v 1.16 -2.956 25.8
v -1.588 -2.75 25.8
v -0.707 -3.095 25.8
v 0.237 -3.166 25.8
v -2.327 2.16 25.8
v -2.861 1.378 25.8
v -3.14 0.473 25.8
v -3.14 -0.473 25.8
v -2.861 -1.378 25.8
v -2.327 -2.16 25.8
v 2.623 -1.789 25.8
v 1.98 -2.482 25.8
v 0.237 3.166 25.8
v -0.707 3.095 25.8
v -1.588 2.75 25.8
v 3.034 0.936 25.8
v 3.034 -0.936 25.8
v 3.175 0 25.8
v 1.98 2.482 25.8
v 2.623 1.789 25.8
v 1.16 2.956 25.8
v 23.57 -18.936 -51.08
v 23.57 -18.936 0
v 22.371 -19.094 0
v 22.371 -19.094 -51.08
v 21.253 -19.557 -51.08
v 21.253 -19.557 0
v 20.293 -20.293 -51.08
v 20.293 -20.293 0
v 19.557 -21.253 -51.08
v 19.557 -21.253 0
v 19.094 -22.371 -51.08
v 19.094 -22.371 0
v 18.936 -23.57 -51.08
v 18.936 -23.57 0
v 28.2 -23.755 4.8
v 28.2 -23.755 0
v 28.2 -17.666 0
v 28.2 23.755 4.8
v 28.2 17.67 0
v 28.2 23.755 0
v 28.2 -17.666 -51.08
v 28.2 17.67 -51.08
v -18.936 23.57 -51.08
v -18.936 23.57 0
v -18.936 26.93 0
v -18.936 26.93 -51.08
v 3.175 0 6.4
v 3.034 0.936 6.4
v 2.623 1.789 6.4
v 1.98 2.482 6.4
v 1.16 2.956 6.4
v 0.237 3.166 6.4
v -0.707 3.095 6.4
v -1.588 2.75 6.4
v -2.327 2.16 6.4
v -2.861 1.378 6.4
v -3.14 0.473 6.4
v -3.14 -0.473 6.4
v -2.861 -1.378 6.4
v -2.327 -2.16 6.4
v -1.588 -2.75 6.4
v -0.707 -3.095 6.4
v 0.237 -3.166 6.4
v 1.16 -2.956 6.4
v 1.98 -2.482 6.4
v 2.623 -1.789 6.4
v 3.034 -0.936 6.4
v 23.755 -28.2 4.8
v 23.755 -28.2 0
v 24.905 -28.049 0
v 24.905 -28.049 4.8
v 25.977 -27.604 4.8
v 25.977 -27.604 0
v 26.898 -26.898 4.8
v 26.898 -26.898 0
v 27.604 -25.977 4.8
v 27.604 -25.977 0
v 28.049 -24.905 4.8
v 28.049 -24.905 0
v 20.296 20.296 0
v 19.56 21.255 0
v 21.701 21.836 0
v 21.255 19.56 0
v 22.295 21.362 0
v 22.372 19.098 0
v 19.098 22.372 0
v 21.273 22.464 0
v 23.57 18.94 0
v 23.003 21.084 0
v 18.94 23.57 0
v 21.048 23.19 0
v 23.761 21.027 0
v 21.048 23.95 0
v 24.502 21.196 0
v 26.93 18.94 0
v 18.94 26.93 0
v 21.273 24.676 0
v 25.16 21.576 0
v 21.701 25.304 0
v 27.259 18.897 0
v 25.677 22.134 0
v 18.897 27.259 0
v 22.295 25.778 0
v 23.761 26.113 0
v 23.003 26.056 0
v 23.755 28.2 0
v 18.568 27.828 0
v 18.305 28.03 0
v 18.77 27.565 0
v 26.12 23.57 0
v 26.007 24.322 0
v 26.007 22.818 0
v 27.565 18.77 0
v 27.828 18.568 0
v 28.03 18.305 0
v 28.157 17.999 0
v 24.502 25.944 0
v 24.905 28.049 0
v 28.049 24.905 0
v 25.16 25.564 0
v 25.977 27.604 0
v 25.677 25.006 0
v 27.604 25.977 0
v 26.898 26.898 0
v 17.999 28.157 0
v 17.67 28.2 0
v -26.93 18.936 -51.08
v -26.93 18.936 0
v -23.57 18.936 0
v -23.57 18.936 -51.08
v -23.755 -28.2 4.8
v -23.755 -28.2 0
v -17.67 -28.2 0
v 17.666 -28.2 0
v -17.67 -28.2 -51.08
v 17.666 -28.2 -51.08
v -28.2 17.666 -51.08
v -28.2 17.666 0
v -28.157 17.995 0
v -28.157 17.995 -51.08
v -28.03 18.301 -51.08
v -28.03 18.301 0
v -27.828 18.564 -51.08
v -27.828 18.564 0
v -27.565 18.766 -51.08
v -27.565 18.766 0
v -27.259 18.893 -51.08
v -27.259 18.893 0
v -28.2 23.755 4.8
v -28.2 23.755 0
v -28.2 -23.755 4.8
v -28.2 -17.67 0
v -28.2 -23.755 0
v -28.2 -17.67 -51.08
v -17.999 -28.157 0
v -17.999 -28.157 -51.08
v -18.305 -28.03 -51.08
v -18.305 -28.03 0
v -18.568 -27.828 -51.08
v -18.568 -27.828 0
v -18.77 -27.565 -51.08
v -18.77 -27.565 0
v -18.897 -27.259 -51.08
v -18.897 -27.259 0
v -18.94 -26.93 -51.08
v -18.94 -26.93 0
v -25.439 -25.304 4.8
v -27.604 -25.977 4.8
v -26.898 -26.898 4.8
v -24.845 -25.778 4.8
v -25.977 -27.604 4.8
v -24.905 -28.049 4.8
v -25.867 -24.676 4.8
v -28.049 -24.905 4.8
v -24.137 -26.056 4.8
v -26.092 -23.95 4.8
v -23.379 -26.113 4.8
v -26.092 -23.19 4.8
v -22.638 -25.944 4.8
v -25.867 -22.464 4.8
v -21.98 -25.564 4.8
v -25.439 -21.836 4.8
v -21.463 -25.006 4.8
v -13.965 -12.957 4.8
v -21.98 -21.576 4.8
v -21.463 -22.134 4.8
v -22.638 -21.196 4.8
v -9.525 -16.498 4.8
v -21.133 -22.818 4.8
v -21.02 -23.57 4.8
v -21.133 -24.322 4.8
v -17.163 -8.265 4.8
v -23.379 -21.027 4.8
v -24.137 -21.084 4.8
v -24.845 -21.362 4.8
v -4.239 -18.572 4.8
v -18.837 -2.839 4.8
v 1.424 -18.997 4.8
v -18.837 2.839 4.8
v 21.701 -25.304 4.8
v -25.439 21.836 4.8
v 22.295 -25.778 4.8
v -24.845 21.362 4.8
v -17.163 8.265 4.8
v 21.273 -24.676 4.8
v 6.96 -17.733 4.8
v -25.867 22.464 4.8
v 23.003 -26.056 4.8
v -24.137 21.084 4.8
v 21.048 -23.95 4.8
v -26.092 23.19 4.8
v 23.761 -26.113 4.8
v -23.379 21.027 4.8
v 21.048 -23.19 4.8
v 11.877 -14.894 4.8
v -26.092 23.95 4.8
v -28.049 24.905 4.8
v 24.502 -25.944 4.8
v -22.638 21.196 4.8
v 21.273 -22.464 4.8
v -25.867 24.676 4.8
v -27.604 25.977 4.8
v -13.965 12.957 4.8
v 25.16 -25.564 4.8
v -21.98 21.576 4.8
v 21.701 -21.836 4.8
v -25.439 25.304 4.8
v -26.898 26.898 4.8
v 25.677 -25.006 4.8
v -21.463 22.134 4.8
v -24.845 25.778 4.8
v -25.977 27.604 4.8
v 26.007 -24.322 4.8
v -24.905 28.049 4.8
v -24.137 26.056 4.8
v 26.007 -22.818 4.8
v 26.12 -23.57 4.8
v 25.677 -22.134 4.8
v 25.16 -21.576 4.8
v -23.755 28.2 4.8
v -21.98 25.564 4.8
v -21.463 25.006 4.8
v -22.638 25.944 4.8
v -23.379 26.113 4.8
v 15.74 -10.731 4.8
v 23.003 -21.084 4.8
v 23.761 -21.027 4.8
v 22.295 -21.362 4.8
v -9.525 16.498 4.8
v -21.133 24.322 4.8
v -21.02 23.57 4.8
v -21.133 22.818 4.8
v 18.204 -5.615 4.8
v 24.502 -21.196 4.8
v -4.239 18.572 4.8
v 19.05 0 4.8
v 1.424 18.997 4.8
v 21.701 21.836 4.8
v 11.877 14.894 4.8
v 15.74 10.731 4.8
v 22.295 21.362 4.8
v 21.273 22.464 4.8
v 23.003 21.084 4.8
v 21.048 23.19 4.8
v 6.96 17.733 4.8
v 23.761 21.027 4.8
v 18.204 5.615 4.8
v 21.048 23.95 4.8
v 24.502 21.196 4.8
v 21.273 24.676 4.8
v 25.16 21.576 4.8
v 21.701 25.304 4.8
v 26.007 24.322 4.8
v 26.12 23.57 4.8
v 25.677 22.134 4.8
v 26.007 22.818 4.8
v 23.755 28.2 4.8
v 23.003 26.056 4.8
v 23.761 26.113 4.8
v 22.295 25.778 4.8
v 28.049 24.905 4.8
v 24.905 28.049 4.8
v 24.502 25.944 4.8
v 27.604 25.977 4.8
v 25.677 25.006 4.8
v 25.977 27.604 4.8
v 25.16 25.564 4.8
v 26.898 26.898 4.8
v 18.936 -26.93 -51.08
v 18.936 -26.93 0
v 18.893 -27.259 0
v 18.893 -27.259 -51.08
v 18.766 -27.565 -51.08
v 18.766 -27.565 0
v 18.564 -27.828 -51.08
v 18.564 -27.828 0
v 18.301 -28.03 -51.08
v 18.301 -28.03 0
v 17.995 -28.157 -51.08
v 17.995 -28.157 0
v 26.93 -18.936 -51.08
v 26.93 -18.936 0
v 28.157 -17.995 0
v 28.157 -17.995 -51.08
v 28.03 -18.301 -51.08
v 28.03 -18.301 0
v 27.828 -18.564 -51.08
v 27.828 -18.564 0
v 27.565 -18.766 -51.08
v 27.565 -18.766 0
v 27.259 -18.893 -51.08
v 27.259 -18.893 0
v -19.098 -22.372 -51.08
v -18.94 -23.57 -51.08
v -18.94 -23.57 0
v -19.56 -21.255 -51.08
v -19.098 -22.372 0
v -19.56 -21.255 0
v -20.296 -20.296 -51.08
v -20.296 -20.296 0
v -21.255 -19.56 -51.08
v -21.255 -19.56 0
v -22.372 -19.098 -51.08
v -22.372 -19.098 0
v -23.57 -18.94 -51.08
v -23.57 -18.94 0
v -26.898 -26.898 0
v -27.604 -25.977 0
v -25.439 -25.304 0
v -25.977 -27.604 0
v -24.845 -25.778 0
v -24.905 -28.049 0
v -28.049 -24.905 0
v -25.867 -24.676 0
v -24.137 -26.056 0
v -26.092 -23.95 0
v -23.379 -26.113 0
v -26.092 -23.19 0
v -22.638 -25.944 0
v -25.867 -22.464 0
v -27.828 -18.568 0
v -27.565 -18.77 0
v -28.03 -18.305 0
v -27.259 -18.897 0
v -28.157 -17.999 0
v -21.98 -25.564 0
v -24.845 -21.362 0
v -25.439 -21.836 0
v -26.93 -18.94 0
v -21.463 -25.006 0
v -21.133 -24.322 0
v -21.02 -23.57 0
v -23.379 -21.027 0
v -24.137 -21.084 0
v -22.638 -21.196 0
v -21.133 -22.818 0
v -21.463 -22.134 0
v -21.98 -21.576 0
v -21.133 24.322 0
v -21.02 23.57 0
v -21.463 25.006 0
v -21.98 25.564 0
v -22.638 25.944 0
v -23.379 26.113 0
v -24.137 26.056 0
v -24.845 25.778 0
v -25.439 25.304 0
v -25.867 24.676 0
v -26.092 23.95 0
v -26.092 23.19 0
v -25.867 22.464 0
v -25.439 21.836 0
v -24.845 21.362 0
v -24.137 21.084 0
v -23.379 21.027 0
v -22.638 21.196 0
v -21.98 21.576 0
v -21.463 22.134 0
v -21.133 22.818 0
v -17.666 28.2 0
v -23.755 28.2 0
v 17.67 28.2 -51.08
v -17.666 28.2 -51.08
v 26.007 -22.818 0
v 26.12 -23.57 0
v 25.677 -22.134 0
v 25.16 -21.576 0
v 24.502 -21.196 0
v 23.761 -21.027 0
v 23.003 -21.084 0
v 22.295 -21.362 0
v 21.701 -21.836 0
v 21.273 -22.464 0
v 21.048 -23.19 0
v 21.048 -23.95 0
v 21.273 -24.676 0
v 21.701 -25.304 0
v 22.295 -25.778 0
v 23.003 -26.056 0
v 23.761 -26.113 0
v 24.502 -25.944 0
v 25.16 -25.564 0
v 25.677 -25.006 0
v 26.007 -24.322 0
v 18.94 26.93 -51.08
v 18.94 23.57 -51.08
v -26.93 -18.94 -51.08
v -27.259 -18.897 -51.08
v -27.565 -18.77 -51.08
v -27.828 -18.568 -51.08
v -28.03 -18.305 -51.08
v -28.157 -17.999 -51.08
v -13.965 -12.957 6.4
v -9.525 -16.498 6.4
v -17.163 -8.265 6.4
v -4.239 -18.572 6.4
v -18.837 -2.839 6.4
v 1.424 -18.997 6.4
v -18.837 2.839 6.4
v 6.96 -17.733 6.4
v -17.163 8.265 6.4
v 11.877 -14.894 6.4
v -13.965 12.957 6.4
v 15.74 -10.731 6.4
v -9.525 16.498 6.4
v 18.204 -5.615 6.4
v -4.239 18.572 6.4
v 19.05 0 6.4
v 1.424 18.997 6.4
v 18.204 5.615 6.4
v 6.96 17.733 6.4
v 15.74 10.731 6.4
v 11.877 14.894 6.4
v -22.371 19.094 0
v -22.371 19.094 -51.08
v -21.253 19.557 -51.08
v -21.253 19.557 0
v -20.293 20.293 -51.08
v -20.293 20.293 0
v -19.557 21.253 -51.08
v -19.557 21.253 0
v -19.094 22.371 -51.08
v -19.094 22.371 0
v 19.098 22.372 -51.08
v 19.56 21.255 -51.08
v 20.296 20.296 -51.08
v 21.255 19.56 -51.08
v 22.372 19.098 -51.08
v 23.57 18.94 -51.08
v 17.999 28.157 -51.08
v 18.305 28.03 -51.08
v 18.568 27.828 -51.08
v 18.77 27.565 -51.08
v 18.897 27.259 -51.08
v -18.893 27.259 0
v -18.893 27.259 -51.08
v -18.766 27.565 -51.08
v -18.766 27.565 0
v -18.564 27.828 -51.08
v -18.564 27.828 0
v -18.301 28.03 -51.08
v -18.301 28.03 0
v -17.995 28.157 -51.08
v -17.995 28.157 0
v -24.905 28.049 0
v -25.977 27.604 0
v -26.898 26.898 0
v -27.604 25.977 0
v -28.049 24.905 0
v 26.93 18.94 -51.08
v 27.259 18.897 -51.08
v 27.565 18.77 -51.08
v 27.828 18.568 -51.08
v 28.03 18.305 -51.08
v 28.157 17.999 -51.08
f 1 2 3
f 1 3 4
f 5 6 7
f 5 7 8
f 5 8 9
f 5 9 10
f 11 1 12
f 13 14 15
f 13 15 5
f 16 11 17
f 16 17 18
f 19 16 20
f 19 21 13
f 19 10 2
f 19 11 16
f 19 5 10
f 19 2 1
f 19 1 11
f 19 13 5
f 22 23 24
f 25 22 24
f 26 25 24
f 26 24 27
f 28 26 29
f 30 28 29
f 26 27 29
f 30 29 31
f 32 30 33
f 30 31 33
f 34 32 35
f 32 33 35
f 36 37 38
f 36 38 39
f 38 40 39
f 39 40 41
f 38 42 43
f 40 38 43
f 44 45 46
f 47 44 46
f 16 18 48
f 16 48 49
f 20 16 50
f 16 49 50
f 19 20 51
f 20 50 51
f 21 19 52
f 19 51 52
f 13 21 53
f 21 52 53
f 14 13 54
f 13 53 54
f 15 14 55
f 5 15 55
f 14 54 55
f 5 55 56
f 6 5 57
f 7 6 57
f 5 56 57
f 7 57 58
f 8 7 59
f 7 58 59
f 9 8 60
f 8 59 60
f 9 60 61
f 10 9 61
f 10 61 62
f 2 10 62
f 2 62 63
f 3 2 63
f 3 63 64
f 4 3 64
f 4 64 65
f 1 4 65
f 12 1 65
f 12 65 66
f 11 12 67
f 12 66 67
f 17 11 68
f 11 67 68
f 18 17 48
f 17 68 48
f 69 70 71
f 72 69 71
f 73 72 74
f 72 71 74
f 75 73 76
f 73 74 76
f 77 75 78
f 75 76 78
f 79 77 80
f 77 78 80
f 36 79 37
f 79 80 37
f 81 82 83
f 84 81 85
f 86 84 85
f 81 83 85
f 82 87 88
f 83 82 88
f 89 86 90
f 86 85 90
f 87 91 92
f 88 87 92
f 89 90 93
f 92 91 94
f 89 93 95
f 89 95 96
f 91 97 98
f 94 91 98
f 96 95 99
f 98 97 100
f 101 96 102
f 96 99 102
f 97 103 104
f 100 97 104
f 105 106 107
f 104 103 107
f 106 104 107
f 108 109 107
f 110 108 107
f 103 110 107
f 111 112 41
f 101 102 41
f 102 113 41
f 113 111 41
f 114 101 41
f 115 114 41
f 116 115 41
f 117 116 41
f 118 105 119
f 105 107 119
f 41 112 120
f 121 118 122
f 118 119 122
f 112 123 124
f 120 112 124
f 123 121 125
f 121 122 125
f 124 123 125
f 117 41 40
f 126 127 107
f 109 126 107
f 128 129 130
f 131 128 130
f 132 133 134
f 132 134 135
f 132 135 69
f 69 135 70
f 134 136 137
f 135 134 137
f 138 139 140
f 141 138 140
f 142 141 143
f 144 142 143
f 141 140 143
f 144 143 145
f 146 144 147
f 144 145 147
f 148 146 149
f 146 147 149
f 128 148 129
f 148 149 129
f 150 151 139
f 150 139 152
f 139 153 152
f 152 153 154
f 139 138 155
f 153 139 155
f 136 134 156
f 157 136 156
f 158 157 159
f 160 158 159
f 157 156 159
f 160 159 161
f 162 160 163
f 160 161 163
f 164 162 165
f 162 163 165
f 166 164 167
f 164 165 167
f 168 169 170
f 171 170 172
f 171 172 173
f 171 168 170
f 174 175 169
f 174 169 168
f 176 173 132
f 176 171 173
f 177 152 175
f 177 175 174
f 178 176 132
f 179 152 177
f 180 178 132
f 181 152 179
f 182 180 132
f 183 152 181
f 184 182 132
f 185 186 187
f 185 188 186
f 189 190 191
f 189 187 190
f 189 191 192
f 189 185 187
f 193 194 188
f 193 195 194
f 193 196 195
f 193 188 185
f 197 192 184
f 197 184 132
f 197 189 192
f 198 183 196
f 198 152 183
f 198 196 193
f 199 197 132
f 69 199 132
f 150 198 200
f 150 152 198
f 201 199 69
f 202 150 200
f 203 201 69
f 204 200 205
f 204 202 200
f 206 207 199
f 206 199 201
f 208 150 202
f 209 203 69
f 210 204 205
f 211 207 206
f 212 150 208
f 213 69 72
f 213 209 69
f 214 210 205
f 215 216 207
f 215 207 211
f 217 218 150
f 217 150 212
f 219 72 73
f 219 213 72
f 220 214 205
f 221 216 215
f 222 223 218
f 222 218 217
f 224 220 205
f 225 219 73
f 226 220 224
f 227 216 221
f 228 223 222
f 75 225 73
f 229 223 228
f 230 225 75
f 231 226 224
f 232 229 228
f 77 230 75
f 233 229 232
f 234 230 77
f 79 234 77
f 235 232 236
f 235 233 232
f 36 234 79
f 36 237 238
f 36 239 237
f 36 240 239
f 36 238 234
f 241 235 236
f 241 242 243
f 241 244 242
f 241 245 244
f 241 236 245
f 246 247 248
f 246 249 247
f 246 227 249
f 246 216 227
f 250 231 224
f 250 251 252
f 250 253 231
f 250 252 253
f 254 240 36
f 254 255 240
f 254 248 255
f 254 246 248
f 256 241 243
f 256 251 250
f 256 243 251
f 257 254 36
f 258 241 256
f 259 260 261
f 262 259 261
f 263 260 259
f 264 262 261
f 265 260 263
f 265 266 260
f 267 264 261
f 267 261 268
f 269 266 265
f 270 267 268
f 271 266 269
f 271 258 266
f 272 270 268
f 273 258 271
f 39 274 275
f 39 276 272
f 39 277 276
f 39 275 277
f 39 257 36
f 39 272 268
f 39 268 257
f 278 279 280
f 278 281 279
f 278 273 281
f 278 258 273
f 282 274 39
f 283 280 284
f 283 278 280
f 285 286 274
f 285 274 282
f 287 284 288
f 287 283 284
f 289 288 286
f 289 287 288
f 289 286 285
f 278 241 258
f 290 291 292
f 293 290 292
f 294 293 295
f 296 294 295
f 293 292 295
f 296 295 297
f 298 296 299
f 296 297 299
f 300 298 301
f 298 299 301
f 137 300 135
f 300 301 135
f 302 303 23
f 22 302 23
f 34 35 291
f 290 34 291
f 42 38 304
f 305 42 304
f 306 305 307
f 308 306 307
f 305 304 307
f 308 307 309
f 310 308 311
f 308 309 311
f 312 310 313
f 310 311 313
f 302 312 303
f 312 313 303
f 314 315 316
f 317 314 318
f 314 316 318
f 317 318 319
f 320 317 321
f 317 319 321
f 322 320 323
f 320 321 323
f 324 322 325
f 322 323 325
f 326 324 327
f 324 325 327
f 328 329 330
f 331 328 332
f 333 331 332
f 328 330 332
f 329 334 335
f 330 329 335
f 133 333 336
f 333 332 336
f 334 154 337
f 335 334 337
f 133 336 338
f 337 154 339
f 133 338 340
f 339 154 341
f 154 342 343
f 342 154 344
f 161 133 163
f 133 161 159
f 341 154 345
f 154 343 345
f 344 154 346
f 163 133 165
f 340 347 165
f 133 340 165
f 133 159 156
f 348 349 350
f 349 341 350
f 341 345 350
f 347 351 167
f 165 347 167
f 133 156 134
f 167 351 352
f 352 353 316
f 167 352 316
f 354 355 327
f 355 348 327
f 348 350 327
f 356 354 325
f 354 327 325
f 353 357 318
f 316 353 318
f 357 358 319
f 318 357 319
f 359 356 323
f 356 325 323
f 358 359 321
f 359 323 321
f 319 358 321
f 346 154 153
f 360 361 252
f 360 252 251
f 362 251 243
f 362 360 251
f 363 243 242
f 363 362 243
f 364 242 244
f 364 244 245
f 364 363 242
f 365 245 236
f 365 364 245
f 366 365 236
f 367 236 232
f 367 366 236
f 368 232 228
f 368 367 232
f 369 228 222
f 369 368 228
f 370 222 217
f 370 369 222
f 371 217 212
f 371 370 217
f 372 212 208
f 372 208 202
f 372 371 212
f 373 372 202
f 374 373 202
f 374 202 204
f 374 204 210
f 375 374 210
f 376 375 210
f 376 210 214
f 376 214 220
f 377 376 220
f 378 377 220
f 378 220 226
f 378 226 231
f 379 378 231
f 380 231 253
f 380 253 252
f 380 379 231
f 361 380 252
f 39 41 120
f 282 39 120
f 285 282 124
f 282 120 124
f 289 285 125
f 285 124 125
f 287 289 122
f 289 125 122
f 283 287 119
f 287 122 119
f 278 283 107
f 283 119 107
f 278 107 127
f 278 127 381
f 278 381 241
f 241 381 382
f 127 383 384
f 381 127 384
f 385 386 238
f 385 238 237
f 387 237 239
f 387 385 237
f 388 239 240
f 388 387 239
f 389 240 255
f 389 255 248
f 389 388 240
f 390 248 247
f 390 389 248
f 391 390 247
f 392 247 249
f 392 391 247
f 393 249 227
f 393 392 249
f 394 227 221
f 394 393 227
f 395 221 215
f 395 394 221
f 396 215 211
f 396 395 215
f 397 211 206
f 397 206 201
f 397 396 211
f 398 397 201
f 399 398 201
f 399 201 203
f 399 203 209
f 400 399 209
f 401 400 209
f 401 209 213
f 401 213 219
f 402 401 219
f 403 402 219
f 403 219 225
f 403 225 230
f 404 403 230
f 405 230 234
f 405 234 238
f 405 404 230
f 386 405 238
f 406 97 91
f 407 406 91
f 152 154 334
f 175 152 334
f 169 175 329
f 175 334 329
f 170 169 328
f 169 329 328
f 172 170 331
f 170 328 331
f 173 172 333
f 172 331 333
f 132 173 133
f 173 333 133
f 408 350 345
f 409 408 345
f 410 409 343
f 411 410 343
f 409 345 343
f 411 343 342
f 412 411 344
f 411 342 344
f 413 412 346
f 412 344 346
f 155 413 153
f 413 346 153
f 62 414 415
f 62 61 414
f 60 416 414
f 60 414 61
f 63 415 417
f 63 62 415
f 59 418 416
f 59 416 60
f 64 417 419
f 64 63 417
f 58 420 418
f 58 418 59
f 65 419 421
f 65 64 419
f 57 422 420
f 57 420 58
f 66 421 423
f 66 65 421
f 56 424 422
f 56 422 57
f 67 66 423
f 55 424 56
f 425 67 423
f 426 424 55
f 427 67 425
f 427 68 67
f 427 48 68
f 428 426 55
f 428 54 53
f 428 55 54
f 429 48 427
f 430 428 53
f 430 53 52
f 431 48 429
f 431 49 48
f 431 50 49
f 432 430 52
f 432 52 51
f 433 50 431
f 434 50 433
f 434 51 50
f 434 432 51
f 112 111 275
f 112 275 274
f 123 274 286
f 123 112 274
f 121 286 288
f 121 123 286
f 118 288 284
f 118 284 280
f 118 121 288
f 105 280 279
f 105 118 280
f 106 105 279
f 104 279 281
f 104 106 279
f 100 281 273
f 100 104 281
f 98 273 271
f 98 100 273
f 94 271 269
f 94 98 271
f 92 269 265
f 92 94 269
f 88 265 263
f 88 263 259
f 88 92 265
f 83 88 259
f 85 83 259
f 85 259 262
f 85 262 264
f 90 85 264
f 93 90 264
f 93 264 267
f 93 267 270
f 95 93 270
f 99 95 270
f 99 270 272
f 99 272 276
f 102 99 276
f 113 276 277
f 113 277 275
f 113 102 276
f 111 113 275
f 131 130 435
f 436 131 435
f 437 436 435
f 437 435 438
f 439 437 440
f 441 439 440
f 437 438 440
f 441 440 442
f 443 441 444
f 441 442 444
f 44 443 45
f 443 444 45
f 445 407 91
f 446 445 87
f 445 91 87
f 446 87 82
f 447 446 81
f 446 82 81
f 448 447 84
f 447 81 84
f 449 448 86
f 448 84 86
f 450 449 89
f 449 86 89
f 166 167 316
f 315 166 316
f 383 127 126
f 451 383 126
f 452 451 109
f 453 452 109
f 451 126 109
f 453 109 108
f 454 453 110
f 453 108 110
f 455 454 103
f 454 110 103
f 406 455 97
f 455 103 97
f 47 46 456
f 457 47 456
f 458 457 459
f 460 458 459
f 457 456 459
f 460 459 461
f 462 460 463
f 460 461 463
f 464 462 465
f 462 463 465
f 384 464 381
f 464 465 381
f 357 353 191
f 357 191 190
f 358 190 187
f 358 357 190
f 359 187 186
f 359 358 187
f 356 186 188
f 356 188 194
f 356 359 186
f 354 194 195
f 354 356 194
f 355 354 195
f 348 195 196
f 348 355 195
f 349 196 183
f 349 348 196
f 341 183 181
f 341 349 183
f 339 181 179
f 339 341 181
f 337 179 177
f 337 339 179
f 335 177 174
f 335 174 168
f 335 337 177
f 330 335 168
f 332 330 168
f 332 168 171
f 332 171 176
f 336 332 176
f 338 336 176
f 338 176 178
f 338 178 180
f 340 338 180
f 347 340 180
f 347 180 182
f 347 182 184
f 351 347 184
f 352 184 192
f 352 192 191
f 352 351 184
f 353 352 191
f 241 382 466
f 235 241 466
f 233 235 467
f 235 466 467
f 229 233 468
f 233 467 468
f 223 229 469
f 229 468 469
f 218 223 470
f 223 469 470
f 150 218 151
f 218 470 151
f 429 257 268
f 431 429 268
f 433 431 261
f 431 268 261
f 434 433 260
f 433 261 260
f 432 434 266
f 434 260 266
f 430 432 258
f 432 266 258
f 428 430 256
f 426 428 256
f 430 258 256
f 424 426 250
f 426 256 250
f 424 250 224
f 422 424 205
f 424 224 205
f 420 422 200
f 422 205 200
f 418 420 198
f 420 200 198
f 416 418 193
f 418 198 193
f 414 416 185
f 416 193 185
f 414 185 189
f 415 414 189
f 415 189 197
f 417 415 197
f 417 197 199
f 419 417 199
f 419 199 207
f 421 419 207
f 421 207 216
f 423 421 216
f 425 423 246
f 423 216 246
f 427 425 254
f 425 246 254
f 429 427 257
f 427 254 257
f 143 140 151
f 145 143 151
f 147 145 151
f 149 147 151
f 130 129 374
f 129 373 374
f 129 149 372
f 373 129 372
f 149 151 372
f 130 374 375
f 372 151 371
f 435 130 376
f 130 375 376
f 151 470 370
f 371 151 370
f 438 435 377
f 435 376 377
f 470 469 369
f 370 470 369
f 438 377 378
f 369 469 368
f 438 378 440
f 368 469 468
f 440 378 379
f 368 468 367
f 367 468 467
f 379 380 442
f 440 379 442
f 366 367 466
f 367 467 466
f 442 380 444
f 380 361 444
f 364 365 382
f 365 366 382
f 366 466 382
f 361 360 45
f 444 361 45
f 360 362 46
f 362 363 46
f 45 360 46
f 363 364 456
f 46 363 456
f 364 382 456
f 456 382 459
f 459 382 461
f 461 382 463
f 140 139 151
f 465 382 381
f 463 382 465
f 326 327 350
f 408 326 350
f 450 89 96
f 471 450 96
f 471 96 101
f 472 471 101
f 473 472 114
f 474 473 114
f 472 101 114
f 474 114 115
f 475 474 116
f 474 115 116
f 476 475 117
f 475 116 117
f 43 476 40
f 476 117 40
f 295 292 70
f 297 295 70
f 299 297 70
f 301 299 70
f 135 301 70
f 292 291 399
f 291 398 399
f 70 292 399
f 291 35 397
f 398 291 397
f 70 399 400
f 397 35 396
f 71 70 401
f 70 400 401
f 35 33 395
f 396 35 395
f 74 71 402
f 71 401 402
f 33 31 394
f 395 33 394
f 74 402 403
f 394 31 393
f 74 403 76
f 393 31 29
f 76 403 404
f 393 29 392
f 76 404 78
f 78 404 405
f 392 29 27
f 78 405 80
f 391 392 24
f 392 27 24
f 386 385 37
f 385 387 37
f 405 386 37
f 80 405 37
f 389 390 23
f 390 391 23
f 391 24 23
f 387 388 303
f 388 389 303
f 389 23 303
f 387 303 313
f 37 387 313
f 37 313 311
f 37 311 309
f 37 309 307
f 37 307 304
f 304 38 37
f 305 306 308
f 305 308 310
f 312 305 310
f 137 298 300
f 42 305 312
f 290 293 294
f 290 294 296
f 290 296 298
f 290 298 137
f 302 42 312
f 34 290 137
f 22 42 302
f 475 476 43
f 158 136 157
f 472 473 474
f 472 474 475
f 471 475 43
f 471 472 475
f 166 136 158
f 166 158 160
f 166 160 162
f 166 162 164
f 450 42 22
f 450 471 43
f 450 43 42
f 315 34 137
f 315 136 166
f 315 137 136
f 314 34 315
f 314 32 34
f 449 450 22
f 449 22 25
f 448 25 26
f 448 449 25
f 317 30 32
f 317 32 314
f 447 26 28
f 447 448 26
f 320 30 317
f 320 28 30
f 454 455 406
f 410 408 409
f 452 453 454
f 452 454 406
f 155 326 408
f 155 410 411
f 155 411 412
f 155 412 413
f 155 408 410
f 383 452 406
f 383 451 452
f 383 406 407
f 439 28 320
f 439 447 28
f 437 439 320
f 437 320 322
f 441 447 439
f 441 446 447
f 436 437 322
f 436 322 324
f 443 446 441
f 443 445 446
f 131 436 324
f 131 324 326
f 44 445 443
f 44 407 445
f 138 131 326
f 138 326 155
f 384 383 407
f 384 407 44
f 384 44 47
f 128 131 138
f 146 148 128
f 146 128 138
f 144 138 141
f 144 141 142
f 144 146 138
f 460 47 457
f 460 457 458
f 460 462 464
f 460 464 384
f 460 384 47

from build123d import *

# Parameters (mm, degrees)
SKETCH1_R           = 2.55
BOSS_EXTRUDE1_DEPTH = 4.8
BOSS_EXTRUDE2_DEPTH = 51.08
SKETCH3_R           = 19.05
BOSS_EXTRUDE3_DEPTH = 1.6
SKETCH4_R           = 3.175
BOSS_EXTRUDE8_DEPTH = 19.4


with BuildPart() as part:
    # Sketch1 → Boss-Extrude1 (new body)
    with BuildSketch(Plane.XY):
        with BuildLine():
            Line((-23.755, -28.2), (23.755, -28.2))
            ThreePointArc((23.755, -28.2), (26.898089642, -26.898089642), (28.2, -23.755))
            Line((28.2, -23.755), (28.2, 23.755))
            ThreePointArc((28.2, 23.755), (26.898089642, 26.898089642), (23.755, 28.2))
            Line((23.755, 28.2), (-23.755, 28.2))
            ThreePointArc((-23.755, 28.2), (-26.898089642, 26.898089642), (-28.2, 23.755))
            Line((-28.2, 23.755), (-28.2, -23.755))
            ThreePointArc((-28.2, -23.755), (-26.898089642, -26.898089642), (-23.755, -28.2))
        make_face()
        with Locations((-23.57, 23.57)):
            Circle(SKETCH1_R, mode=Mode.SUBTRACT)
        with Locations((23.57, 23.57)):
            Circle(SKETCH1_R, mode=Mode.SUBTRACT)
        with Locations((23.57, -23.57)):
            Circle(SKETCH1_R, mode=Mode.SUBTRACT)
        with Locations((-23.57, -23.57)):
            Circle(SKETCH1_R, mode=Mode.SUBTRACT)
    extrude(amount=BOSS_EXTRUDE1_DEPTH)

    # Sketch2 → Boss-Extrude2 (add)
    with BuildSketch(Plane(origin=(0, 0, 0), x_dir=(-1, 0, 0), z_dir=(0, 0, -1))):
        with BuildLine():
            Line((23.57, -18.94), (26.93, -18.94))
            ThreePointArc((26.93, -18.94), (27.828025612, -18.568025612), (28.2, -17.67))
            Line((28.2, -17.67), (28.2, 17.66630547))
            ThreePointArc((28.2, 17.66630547), (27.828025612, 18.564331082), (26.93, 18.93630547))
            Line((26.93, 18.93630547), (23.57, 18.93630547))
            ThreePointArc((23.57, 18.93630547), (20.293483176, 20.293483176), (18.93630547, 23.57))
            Line((18.93630547, 23.57), (18.93630547, 26.93))
            ThreePointArc((18.93630547, 26.93), (18.564331082, 27.828025612), (17.66630547, 28.2))
            Line((17.66630547, 28.2), (-17.67, 28.2))
            ThreePointArc((-17.67, 28.2), (-18.568025612, 27.828025612), (-18.94, 26.93))
            Line((-18.94, 26.93), (-18.94, 23.57))
            ThreePointArc((-18.94, 23.57), (-20.296095603, 20.296095603), (-23.57, 18.94))
            Line((-23.57, 18.94), (-26.93, 18.94))
            ThreePointArc((-26.93, 18.94), (-27.828025612, 18.568025612), (-28.2, 17.67))
            Line((-28.2, 17.67), (-28.2, -17.66630547))
            ThreePointArc((-28.2, -17.66630547), (-27.828025612, -18.564331082), (-26.93, -18.93630547))
            Line((-26.93, -18.93630547), (-23.57, -18.93630547))
            ThreePointArc((-23.57, -18.93630547), (-20.293483176, -20.293483176), (-18.93630547, -23.57))
            Line((-18.93630547, -23.57), (-18.93630547, -26.93))
            ThreePointArc((-18.93630547, -26.93), (-18.564331082, -27.828025612), (-17.66630547, -28.2))
            Line((-17.66630547, -28.2), (17.67, -28.2))
            ThreePointArc((17.67, -28.2), (18.568025612, -27.828025612), (18.94, -26.93))
            Line((18.94, -26.93), (18.94, -23.57))
            ThreePointArc((18.94, -23.57), (20.296095603, -20.296095603), (23.57, -18.94))
        make_face()
    extrude(amount=BOSS_EXTRUDE2_DEPTH)

    # Sketch3 → Boss-Extrude3 (add)
    with BuildSketch(Plane.XY.offset(4.8)):
        Circle(SKETCH3_R)
    extrude(amount=BOSS_EXTRUDE3_DEPTH)

    # Sketch4 → Boss-Extrude8 (add)
    with BuildSketch(Plane.XY.offset(6.4)):
        Circle(SKETCH4_R)
    extrude(amount=BOSS_EXTRUDE8_DEPTH)


solid = part.part
